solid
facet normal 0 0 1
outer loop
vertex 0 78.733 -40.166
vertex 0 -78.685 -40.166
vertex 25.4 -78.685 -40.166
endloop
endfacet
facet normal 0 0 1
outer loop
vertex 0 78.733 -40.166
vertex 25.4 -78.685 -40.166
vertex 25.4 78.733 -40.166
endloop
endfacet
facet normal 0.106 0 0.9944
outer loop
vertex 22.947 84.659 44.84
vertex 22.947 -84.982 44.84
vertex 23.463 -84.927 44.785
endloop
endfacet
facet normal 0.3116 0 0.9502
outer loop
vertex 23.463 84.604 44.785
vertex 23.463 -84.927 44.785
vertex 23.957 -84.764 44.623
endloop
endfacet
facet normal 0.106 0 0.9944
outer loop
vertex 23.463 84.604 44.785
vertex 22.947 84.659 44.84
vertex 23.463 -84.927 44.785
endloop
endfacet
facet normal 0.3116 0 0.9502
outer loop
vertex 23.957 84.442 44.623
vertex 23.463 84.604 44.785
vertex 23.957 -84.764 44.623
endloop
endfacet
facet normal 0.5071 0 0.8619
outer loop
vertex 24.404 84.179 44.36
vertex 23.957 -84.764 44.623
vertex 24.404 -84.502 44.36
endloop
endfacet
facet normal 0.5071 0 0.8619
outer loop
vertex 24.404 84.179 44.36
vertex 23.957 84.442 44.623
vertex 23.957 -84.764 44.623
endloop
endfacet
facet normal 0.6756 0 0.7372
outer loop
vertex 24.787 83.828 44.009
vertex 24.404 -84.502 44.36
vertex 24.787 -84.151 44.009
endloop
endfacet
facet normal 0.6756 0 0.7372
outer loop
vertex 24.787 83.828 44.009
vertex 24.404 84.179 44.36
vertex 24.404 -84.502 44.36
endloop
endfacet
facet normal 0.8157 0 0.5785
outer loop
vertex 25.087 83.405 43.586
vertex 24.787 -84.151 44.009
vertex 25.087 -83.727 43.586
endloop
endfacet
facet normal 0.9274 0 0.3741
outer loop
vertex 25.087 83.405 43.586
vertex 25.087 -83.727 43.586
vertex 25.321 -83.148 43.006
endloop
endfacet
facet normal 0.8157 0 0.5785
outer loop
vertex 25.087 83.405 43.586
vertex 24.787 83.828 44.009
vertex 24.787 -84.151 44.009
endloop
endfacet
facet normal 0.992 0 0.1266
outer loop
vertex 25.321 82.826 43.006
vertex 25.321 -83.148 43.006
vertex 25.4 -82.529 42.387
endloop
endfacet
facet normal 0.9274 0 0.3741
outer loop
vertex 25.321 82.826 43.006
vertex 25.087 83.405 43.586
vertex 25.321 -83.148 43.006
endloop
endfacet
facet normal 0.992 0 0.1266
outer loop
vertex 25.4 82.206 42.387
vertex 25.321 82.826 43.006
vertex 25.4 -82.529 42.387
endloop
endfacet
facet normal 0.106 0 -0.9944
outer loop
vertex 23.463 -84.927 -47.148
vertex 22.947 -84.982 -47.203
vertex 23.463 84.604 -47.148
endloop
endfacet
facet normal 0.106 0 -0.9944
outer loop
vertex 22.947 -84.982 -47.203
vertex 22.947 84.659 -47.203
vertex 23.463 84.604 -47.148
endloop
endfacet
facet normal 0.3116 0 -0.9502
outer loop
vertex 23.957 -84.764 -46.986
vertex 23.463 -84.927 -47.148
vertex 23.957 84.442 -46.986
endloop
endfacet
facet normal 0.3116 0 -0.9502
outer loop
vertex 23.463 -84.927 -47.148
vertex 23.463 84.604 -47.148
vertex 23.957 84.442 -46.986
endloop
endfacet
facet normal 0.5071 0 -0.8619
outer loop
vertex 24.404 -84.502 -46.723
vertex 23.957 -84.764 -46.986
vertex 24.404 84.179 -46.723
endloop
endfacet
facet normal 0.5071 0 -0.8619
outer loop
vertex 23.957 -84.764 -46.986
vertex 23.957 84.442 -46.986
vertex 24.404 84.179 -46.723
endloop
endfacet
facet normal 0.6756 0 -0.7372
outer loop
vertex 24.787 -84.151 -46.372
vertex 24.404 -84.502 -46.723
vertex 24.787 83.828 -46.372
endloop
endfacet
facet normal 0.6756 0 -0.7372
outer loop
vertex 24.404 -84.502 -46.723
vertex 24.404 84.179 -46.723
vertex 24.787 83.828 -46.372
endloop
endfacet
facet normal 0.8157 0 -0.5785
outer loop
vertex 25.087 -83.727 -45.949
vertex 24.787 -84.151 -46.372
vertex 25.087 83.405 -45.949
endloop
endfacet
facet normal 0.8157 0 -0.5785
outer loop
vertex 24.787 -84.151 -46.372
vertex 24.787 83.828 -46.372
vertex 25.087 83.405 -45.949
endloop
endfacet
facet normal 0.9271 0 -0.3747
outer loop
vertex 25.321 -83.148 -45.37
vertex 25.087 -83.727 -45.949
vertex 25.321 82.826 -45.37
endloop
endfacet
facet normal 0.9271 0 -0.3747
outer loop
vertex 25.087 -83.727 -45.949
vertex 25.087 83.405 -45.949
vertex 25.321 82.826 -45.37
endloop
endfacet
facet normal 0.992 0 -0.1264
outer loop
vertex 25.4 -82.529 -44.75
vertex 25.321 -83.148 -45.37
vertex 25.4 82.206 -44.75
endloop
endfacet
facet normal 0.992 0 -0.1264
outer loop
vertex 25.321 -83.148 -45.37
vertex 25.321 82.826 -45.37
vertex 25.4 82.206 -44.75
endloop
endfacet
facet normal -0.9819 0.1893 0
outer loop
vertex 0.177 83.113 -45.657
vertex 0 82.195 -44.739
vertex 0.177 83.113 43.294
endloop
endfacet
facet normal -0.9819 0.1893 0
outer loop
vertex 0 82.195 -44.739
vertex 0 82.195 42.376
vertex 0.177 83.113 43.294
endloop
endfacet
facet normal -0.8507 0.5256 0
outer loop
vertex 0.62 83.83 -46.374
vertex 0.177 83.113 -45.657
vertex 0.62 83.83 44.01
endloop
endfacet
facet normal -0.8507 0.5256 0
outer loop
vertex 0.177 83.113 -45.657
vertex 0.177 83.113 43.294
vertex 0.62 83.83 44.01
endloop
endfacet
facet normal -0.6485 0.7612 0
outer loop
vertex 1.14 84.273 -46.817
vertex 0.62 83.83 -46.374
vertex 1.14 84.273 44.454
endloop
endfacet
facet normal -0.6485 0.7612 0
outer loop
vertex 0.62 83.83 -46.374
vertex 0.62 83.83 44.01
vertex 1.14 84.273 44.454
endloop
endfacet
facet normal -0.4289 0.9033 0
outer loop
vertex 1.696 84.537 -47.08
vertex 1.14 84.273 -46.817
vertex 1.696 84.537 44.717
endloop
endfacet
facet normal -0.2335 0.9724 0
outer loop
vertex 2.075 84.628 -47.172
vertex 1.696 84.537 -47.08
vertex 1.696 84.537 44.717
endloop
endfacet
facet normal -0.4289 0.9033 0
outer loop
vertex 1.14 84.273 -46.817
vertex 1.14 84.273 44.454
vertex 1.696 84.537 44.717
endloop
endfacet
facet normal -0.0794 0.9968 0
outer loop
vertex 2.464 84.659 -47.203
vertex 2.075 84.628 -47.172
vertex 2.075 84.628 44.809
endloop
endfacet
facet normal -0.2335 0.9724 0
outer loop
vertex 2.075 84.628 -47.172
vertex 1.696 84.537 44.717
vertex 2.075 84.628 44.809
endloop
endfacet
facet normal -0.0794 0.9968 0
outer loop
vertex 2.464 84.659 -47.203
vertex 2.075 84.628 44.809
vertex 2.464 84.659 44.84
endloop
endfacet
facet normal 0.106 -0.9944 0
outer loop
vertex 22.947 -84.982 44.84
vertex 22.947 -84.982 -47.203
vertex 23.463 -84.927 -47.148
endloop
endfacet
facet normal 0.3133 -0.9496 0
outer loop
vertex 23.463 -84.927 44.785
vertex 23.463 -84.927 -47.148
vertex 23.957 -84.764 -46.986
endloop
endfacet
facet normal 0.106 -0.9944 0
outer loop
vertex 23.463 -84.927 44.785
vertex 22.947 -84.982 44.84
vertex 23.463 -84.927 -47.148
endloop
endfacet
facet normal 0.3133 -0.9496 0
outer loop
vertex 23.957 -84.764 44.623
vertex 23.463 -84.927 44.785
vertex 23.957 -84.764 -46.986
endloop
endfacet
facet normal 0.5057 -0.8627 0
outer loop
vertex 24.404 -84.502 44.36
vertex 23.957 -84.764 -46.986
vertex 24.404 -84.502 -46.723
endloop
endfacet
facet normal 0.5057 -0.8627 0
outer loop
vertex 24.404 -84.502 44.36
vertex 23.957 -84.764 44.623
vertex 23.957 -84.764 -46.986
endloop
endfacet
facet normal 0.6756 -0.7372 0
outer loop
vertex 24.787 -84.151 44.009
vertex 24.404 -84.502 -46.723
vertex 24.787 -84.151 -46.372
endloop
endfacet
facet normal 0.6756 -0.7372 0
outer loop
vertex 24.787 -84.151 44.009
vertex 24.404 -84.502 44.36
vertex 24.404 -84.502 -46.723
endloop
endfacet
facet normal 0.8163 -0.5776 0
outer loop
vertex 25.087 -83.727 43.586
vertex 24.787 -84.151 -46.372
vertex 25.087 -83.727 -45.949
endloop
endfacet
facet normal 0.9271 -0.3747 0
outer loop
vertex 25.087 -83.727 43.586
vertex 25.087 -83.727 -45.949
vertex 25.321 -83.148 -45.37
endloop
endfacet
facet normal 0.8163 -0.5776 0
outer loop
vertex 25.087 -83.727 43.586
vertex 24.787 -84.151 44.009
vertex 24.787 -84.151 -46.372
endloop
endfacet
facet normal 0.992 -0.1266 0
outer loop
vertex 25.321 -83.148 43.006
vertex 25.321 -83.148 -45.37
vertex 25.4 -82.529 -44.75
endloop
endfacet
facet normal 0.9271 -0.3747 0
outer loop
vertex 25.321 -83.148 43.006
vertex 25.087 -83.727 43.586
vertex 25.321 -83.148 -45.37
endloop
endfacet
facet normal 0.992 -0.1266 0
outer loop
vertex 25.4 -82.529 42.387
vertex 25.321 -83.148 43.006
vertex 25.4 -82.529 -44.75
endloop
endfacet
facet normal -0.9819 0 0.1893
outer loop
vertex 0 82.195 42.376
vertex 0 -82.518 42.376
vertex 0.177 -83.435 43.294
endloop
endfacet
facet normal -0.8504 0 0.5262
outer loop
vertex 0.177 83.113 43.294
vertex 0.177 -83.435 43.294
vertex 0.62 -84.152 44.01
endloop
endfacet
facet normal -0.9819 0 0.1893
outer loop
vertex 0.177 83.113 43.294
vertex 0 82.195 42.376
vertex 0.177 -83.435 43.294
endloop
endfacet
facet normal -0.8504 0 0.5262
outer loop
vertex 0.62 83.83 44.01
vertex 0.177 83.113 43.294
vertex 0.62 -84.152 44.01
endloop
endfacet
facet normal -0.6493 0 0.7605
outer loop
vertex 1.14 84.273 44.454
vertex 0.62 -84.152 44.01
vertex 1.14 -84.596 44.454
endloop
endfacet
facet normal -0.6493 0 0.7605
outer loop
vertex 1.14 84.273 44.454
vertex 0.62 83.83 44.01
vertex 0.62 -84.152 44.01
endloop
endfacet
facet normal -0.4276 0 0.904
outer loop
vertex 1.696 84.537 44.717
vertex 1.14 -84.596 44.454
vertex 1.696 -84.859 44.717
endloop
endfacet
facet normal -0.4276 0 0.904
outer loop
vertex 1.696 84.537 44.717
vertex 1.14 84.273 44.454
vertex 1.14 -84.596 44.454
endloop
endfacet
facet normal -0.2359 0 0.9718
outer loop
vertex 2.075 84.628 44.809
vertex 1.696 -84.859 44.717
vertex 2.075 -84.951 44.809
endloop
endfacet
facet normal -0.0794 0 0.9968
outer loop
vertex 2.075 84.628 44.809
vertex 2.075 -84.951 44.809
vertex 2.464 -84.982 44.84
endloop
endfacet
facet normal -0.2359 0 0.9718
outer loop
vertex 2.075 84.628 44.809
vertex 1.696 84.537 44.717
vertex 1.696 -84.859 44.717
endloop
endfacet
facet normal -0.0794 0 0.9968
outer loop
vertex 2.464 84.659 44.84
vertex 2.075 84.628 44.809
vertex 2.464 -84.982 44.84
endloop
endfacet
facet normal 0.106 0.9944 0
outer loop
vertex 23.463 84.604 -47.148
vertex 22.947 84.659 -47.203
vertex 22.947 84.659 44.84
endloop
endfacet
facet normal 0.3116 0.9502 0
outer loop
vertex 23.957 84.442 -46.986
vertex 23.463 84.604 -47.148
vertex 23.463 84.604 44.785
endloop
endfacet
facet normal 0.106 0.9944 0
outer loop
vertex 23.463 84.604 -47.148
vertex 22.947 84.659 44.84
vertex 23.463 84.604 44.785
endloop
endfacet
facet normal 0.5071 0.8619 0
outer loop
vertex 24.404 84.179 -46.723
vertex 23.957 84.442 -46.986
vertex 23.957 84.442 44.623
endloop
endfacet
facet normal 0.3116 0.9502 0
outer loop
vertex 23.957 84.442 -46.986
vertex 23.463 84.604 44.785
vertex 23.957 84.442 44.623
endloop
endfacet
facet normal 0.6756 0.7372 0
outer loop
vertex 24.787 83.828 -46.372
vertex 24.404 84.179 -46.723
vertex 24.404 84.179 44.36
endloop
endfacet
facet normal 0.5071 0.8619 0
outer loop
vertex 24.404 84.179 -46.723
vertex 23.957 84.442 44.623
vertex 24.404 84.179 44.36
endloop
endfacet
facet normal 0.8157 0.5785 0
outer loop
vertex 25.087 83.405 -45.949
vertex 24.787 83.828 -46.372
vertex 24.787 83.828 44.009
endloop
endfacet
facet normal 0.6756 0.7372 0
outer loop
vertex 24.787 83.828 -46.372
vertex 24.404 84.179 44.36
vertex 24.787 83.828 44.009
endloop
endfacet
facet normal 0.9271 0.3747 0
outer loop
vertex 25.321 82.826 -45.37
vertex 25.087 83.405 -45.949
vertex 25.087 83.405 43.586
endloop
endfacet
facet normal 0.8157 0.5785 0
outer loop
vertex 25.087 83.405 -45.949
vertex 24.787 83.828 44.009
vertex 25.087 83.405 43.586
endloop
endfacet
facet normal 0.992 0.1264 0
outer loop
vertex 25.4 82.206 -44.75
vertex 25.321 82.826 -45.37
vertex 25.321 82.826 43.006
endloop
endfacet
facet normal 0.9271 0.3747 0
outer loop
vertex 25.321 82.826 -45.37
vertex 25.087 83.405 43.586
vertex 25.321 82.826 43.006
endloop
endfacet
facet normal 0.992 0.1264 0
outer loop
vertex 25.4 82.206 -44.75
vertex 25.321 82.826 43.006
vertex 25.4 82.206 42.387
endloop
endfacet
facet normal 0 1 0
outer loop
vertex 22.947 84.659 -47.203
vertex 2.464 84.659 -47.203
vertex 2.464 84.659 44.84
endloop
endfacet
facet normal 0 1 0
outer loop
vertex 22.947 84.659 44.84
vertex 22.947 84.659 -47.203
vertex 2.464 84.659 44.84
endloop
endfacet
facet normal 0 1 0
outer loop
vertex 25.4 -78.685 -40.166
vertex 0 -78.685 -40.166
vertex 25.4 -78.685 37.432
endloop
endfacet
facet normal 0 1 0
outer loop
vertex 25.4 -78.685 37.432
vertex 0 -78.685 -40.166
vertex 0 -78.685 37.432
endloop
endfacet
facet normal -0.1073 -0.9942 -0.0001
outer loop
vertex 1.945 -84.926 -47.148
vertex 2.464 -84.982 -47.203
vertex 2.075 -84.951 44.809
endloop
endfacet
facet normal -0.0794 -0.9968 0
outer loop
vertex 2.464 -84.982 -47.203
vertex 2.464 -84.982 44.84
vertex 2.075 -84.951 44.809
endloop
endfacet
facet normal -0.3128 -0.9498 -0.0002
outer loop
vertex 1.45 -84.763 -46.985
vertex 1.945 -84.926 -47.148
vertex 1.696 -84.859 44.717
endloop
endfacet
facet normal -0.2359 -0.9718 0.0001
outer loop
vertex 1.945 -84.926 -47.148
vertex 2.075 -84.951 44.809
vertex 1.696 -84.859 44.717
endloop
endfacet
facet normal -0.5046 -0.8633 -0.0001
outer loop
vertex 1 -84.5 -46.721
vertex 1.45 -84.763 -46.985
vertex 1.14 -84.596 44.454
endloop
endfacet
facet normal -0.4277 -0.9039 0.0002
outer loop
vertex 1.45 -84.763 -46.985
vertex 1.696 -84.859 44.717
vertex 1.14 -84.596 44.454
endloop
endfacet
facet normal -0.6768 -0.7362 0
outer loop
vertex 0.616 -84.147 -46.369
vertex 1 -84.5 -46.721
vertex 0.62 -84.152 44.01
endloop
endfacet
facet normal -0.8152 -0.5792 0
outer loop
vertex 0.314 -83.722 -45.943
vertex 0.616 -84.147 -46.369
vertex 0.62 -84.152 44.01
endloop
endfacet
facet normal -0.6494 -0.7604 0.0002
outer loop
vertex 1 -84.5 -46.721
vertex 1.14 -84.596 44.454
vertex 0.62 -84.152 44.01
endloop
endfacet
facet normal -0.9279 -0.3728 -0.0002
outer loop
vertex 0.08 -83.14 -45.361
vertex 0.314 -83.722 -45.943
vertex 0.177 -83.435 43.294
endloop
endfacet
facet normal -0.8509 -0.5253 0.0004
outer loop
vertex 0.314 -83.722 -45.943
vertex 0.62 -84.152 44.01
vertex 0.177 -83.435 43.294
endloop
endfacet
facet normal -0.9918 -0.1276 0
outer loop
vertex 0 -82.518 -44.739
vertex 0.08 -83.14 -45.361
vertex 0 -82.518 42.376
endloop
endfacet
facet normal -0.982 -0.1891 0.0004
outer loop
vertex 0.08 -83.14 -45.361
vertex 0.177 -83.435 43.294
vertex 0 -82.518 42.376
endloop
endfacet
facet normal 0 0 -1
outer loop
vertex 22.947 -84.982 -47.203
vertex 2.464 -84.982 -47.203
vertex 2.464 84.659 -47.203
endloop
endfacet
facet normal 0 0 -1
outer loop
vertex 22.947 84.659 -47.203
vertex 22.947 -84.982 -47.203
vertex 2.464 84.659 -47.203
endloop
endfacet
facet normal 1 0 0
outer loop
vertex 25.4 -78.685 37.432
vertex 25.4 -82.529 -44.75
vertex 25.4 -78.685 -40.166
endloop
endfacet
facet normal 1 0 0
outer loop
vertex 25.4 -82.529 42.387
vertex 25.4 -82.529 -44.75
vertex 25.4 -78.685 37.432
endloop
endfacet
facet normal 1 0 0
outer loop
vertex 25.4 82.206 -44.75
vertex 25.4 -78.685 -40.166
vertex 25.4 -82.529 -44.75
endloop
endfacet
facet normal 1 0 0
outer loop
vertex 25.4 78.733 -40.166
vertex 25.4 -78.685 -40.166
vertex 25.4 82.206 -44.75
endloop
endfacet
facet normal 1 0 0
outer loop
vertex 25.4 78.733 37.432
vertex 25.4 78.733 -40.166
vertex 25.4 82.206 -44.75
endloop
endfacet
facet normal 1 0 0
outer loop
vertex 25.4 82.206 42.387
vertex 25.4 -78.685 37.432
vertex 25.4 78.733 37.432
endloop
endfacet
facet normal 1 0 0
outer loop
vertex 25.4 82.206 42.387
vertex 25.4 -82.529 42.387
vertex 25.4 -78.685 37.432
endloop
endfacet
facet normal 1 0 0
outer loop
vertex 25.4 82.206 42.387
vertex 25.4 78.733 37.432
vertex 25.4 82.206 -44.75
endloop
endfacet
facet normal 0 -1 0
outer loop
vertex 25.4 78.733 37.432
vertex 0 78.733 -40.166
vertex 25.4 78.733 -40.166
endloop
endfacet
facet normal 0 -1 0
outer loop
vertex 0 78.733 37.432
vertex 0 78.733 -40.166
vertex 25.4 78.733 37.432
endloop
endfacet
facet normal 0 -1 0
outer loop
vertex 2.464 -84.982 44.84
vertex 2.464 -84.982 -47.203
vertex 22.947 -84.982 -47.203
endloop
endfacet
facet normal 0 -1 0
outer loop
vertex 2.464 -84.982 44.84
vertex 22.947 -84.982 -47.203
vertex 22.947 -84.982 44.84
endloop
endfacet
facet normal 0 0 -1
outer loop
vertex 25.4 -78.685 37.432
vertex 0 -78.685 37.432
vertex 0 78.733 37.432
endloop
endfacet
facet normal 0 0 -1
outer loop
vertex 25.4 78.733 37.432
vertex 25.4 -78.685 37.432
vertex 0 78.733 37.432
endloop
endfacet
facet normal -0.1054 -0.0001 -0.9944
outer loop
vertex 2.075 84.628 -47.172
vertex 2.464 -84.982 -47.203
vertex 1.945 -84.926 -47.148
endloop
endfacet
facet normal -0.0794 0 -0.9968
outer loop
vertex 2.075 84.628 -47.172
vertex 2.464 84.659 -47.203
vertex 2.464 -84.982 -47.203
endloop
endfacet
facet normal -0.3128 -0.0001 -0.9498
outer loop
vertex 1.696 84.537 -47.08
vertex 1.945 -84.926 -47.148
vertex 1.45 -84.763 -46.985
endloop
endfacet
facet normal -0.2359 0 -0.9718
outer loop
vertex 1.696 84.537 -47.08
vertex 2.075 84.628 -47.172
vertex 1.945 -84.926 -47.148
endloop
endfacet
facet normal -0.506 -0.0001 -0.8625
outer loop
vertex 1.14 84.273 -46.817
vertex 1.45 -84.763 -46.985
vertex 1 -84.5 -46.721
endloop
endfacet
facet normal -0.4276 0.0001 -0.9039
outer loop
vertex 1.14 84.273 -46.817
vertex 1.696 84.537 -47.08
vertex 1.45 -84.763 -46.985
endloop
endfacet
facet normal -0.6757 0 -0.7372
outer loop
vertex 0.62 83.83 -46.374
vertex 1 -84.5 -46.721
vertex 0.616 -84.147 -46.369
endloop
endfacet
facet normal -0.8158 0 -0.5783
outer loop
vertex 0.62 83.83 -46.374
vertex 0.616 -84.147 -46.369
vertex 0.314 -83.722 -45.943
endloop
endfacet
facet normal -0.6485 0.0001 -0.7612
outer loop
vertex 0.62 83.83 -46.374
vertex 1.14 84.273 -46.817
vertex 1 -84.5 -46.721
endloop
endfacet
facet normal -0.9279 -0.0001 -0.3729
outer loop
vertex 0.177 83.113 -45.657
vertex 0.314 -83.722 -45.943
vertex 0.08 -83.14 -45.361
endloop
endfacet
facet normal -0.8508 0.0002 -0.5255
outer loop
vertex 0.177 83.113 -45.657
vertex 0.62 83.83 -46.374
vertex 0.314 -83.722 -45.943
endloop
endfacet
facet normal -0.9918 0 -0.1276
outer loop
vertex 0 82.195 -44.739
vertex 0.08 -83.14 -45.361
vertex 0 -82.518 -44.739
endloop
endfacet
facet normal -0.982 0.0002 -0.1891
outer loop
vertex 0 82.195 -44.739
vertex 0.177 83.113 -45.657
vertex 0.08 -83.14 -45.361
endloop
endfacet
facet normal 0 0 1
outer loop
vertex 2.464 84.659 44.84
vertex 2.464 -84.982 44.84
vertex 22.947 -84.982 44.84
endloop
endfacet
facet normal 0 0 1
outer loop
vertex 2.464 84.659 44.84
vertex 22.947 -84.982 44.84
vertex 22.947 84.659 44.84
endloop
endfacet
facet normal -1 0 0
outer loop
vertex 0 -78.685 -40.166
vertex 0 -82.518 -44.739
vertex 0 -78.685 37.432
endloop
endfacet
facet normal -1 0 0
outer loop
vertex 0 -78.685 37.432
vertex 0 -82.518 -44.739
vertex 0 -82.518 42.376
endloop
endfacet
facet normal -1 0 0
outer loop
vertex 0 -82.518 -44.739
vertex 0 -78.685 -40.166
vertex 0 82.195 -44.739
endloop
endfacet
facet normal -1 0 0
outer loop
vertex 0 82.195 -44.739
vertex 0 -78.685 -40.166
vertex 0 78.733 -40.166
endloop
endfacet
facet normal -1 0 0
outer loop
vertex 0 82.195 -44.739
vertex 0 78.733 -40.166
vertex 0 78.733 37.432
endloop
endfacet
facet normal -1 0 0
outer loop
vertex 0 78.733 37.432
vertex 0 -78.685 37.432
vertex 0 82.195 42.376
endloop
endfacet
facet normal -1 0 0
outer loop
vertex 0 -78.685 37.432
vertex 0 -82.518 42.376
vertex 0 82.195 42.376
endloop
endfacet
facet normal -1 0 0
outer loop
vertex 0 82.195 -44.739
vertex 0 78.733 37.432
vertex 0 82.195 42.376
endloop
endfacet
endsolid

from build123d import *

# Parameters (mm, degrees)
F0_W     = 169.640712
F0_H     = 92.04305
F0_W_2   = 157.417692
F0_H_2   = 77.59766
F1_DEPTH = 25.4
F2_R     = 2.452841
F3_R     = 2.4638


with BuildPart() as f1:
    # F0 (on Right) → F1 (new body)
    with BuildSketch(Plane.YZ):
        with Locations((-0.161145, -1.181595)):
            Rectangle(F0_W, F0_H)
        with Locations((0.024054, -1.366796)):
            Rectangle(F0_W_2, F0_H_2, mode=Mode.SUBTRACT)
    extrude(amount=F1_DEPTH)

    # F2
    f2_edges = [f1.edges().sort_by_distance(p)[0] for p in [
        (25.4, -0.161145, -47.20312),
        (25.4, -84.981501, -1.181595),
        (25.4, -0.161145, 44.83993),
        (25.4, 84.659211, -1.181595),
    ]]
    fillet(f2_edges, radius=F2_R)

    # F3
    f3_edges = [f1.edges().sort_by_distance(p)[0] for p in [
        (0, 84.659211, -1.181595),
        (0, -0.161145, 44.83993),
        (0, -0.161145, -47.20312),
        (0, -84.981501, -1.181595),
    ]]
    fillet(f3_edges, radius=F3_R)


solid = f1.part
